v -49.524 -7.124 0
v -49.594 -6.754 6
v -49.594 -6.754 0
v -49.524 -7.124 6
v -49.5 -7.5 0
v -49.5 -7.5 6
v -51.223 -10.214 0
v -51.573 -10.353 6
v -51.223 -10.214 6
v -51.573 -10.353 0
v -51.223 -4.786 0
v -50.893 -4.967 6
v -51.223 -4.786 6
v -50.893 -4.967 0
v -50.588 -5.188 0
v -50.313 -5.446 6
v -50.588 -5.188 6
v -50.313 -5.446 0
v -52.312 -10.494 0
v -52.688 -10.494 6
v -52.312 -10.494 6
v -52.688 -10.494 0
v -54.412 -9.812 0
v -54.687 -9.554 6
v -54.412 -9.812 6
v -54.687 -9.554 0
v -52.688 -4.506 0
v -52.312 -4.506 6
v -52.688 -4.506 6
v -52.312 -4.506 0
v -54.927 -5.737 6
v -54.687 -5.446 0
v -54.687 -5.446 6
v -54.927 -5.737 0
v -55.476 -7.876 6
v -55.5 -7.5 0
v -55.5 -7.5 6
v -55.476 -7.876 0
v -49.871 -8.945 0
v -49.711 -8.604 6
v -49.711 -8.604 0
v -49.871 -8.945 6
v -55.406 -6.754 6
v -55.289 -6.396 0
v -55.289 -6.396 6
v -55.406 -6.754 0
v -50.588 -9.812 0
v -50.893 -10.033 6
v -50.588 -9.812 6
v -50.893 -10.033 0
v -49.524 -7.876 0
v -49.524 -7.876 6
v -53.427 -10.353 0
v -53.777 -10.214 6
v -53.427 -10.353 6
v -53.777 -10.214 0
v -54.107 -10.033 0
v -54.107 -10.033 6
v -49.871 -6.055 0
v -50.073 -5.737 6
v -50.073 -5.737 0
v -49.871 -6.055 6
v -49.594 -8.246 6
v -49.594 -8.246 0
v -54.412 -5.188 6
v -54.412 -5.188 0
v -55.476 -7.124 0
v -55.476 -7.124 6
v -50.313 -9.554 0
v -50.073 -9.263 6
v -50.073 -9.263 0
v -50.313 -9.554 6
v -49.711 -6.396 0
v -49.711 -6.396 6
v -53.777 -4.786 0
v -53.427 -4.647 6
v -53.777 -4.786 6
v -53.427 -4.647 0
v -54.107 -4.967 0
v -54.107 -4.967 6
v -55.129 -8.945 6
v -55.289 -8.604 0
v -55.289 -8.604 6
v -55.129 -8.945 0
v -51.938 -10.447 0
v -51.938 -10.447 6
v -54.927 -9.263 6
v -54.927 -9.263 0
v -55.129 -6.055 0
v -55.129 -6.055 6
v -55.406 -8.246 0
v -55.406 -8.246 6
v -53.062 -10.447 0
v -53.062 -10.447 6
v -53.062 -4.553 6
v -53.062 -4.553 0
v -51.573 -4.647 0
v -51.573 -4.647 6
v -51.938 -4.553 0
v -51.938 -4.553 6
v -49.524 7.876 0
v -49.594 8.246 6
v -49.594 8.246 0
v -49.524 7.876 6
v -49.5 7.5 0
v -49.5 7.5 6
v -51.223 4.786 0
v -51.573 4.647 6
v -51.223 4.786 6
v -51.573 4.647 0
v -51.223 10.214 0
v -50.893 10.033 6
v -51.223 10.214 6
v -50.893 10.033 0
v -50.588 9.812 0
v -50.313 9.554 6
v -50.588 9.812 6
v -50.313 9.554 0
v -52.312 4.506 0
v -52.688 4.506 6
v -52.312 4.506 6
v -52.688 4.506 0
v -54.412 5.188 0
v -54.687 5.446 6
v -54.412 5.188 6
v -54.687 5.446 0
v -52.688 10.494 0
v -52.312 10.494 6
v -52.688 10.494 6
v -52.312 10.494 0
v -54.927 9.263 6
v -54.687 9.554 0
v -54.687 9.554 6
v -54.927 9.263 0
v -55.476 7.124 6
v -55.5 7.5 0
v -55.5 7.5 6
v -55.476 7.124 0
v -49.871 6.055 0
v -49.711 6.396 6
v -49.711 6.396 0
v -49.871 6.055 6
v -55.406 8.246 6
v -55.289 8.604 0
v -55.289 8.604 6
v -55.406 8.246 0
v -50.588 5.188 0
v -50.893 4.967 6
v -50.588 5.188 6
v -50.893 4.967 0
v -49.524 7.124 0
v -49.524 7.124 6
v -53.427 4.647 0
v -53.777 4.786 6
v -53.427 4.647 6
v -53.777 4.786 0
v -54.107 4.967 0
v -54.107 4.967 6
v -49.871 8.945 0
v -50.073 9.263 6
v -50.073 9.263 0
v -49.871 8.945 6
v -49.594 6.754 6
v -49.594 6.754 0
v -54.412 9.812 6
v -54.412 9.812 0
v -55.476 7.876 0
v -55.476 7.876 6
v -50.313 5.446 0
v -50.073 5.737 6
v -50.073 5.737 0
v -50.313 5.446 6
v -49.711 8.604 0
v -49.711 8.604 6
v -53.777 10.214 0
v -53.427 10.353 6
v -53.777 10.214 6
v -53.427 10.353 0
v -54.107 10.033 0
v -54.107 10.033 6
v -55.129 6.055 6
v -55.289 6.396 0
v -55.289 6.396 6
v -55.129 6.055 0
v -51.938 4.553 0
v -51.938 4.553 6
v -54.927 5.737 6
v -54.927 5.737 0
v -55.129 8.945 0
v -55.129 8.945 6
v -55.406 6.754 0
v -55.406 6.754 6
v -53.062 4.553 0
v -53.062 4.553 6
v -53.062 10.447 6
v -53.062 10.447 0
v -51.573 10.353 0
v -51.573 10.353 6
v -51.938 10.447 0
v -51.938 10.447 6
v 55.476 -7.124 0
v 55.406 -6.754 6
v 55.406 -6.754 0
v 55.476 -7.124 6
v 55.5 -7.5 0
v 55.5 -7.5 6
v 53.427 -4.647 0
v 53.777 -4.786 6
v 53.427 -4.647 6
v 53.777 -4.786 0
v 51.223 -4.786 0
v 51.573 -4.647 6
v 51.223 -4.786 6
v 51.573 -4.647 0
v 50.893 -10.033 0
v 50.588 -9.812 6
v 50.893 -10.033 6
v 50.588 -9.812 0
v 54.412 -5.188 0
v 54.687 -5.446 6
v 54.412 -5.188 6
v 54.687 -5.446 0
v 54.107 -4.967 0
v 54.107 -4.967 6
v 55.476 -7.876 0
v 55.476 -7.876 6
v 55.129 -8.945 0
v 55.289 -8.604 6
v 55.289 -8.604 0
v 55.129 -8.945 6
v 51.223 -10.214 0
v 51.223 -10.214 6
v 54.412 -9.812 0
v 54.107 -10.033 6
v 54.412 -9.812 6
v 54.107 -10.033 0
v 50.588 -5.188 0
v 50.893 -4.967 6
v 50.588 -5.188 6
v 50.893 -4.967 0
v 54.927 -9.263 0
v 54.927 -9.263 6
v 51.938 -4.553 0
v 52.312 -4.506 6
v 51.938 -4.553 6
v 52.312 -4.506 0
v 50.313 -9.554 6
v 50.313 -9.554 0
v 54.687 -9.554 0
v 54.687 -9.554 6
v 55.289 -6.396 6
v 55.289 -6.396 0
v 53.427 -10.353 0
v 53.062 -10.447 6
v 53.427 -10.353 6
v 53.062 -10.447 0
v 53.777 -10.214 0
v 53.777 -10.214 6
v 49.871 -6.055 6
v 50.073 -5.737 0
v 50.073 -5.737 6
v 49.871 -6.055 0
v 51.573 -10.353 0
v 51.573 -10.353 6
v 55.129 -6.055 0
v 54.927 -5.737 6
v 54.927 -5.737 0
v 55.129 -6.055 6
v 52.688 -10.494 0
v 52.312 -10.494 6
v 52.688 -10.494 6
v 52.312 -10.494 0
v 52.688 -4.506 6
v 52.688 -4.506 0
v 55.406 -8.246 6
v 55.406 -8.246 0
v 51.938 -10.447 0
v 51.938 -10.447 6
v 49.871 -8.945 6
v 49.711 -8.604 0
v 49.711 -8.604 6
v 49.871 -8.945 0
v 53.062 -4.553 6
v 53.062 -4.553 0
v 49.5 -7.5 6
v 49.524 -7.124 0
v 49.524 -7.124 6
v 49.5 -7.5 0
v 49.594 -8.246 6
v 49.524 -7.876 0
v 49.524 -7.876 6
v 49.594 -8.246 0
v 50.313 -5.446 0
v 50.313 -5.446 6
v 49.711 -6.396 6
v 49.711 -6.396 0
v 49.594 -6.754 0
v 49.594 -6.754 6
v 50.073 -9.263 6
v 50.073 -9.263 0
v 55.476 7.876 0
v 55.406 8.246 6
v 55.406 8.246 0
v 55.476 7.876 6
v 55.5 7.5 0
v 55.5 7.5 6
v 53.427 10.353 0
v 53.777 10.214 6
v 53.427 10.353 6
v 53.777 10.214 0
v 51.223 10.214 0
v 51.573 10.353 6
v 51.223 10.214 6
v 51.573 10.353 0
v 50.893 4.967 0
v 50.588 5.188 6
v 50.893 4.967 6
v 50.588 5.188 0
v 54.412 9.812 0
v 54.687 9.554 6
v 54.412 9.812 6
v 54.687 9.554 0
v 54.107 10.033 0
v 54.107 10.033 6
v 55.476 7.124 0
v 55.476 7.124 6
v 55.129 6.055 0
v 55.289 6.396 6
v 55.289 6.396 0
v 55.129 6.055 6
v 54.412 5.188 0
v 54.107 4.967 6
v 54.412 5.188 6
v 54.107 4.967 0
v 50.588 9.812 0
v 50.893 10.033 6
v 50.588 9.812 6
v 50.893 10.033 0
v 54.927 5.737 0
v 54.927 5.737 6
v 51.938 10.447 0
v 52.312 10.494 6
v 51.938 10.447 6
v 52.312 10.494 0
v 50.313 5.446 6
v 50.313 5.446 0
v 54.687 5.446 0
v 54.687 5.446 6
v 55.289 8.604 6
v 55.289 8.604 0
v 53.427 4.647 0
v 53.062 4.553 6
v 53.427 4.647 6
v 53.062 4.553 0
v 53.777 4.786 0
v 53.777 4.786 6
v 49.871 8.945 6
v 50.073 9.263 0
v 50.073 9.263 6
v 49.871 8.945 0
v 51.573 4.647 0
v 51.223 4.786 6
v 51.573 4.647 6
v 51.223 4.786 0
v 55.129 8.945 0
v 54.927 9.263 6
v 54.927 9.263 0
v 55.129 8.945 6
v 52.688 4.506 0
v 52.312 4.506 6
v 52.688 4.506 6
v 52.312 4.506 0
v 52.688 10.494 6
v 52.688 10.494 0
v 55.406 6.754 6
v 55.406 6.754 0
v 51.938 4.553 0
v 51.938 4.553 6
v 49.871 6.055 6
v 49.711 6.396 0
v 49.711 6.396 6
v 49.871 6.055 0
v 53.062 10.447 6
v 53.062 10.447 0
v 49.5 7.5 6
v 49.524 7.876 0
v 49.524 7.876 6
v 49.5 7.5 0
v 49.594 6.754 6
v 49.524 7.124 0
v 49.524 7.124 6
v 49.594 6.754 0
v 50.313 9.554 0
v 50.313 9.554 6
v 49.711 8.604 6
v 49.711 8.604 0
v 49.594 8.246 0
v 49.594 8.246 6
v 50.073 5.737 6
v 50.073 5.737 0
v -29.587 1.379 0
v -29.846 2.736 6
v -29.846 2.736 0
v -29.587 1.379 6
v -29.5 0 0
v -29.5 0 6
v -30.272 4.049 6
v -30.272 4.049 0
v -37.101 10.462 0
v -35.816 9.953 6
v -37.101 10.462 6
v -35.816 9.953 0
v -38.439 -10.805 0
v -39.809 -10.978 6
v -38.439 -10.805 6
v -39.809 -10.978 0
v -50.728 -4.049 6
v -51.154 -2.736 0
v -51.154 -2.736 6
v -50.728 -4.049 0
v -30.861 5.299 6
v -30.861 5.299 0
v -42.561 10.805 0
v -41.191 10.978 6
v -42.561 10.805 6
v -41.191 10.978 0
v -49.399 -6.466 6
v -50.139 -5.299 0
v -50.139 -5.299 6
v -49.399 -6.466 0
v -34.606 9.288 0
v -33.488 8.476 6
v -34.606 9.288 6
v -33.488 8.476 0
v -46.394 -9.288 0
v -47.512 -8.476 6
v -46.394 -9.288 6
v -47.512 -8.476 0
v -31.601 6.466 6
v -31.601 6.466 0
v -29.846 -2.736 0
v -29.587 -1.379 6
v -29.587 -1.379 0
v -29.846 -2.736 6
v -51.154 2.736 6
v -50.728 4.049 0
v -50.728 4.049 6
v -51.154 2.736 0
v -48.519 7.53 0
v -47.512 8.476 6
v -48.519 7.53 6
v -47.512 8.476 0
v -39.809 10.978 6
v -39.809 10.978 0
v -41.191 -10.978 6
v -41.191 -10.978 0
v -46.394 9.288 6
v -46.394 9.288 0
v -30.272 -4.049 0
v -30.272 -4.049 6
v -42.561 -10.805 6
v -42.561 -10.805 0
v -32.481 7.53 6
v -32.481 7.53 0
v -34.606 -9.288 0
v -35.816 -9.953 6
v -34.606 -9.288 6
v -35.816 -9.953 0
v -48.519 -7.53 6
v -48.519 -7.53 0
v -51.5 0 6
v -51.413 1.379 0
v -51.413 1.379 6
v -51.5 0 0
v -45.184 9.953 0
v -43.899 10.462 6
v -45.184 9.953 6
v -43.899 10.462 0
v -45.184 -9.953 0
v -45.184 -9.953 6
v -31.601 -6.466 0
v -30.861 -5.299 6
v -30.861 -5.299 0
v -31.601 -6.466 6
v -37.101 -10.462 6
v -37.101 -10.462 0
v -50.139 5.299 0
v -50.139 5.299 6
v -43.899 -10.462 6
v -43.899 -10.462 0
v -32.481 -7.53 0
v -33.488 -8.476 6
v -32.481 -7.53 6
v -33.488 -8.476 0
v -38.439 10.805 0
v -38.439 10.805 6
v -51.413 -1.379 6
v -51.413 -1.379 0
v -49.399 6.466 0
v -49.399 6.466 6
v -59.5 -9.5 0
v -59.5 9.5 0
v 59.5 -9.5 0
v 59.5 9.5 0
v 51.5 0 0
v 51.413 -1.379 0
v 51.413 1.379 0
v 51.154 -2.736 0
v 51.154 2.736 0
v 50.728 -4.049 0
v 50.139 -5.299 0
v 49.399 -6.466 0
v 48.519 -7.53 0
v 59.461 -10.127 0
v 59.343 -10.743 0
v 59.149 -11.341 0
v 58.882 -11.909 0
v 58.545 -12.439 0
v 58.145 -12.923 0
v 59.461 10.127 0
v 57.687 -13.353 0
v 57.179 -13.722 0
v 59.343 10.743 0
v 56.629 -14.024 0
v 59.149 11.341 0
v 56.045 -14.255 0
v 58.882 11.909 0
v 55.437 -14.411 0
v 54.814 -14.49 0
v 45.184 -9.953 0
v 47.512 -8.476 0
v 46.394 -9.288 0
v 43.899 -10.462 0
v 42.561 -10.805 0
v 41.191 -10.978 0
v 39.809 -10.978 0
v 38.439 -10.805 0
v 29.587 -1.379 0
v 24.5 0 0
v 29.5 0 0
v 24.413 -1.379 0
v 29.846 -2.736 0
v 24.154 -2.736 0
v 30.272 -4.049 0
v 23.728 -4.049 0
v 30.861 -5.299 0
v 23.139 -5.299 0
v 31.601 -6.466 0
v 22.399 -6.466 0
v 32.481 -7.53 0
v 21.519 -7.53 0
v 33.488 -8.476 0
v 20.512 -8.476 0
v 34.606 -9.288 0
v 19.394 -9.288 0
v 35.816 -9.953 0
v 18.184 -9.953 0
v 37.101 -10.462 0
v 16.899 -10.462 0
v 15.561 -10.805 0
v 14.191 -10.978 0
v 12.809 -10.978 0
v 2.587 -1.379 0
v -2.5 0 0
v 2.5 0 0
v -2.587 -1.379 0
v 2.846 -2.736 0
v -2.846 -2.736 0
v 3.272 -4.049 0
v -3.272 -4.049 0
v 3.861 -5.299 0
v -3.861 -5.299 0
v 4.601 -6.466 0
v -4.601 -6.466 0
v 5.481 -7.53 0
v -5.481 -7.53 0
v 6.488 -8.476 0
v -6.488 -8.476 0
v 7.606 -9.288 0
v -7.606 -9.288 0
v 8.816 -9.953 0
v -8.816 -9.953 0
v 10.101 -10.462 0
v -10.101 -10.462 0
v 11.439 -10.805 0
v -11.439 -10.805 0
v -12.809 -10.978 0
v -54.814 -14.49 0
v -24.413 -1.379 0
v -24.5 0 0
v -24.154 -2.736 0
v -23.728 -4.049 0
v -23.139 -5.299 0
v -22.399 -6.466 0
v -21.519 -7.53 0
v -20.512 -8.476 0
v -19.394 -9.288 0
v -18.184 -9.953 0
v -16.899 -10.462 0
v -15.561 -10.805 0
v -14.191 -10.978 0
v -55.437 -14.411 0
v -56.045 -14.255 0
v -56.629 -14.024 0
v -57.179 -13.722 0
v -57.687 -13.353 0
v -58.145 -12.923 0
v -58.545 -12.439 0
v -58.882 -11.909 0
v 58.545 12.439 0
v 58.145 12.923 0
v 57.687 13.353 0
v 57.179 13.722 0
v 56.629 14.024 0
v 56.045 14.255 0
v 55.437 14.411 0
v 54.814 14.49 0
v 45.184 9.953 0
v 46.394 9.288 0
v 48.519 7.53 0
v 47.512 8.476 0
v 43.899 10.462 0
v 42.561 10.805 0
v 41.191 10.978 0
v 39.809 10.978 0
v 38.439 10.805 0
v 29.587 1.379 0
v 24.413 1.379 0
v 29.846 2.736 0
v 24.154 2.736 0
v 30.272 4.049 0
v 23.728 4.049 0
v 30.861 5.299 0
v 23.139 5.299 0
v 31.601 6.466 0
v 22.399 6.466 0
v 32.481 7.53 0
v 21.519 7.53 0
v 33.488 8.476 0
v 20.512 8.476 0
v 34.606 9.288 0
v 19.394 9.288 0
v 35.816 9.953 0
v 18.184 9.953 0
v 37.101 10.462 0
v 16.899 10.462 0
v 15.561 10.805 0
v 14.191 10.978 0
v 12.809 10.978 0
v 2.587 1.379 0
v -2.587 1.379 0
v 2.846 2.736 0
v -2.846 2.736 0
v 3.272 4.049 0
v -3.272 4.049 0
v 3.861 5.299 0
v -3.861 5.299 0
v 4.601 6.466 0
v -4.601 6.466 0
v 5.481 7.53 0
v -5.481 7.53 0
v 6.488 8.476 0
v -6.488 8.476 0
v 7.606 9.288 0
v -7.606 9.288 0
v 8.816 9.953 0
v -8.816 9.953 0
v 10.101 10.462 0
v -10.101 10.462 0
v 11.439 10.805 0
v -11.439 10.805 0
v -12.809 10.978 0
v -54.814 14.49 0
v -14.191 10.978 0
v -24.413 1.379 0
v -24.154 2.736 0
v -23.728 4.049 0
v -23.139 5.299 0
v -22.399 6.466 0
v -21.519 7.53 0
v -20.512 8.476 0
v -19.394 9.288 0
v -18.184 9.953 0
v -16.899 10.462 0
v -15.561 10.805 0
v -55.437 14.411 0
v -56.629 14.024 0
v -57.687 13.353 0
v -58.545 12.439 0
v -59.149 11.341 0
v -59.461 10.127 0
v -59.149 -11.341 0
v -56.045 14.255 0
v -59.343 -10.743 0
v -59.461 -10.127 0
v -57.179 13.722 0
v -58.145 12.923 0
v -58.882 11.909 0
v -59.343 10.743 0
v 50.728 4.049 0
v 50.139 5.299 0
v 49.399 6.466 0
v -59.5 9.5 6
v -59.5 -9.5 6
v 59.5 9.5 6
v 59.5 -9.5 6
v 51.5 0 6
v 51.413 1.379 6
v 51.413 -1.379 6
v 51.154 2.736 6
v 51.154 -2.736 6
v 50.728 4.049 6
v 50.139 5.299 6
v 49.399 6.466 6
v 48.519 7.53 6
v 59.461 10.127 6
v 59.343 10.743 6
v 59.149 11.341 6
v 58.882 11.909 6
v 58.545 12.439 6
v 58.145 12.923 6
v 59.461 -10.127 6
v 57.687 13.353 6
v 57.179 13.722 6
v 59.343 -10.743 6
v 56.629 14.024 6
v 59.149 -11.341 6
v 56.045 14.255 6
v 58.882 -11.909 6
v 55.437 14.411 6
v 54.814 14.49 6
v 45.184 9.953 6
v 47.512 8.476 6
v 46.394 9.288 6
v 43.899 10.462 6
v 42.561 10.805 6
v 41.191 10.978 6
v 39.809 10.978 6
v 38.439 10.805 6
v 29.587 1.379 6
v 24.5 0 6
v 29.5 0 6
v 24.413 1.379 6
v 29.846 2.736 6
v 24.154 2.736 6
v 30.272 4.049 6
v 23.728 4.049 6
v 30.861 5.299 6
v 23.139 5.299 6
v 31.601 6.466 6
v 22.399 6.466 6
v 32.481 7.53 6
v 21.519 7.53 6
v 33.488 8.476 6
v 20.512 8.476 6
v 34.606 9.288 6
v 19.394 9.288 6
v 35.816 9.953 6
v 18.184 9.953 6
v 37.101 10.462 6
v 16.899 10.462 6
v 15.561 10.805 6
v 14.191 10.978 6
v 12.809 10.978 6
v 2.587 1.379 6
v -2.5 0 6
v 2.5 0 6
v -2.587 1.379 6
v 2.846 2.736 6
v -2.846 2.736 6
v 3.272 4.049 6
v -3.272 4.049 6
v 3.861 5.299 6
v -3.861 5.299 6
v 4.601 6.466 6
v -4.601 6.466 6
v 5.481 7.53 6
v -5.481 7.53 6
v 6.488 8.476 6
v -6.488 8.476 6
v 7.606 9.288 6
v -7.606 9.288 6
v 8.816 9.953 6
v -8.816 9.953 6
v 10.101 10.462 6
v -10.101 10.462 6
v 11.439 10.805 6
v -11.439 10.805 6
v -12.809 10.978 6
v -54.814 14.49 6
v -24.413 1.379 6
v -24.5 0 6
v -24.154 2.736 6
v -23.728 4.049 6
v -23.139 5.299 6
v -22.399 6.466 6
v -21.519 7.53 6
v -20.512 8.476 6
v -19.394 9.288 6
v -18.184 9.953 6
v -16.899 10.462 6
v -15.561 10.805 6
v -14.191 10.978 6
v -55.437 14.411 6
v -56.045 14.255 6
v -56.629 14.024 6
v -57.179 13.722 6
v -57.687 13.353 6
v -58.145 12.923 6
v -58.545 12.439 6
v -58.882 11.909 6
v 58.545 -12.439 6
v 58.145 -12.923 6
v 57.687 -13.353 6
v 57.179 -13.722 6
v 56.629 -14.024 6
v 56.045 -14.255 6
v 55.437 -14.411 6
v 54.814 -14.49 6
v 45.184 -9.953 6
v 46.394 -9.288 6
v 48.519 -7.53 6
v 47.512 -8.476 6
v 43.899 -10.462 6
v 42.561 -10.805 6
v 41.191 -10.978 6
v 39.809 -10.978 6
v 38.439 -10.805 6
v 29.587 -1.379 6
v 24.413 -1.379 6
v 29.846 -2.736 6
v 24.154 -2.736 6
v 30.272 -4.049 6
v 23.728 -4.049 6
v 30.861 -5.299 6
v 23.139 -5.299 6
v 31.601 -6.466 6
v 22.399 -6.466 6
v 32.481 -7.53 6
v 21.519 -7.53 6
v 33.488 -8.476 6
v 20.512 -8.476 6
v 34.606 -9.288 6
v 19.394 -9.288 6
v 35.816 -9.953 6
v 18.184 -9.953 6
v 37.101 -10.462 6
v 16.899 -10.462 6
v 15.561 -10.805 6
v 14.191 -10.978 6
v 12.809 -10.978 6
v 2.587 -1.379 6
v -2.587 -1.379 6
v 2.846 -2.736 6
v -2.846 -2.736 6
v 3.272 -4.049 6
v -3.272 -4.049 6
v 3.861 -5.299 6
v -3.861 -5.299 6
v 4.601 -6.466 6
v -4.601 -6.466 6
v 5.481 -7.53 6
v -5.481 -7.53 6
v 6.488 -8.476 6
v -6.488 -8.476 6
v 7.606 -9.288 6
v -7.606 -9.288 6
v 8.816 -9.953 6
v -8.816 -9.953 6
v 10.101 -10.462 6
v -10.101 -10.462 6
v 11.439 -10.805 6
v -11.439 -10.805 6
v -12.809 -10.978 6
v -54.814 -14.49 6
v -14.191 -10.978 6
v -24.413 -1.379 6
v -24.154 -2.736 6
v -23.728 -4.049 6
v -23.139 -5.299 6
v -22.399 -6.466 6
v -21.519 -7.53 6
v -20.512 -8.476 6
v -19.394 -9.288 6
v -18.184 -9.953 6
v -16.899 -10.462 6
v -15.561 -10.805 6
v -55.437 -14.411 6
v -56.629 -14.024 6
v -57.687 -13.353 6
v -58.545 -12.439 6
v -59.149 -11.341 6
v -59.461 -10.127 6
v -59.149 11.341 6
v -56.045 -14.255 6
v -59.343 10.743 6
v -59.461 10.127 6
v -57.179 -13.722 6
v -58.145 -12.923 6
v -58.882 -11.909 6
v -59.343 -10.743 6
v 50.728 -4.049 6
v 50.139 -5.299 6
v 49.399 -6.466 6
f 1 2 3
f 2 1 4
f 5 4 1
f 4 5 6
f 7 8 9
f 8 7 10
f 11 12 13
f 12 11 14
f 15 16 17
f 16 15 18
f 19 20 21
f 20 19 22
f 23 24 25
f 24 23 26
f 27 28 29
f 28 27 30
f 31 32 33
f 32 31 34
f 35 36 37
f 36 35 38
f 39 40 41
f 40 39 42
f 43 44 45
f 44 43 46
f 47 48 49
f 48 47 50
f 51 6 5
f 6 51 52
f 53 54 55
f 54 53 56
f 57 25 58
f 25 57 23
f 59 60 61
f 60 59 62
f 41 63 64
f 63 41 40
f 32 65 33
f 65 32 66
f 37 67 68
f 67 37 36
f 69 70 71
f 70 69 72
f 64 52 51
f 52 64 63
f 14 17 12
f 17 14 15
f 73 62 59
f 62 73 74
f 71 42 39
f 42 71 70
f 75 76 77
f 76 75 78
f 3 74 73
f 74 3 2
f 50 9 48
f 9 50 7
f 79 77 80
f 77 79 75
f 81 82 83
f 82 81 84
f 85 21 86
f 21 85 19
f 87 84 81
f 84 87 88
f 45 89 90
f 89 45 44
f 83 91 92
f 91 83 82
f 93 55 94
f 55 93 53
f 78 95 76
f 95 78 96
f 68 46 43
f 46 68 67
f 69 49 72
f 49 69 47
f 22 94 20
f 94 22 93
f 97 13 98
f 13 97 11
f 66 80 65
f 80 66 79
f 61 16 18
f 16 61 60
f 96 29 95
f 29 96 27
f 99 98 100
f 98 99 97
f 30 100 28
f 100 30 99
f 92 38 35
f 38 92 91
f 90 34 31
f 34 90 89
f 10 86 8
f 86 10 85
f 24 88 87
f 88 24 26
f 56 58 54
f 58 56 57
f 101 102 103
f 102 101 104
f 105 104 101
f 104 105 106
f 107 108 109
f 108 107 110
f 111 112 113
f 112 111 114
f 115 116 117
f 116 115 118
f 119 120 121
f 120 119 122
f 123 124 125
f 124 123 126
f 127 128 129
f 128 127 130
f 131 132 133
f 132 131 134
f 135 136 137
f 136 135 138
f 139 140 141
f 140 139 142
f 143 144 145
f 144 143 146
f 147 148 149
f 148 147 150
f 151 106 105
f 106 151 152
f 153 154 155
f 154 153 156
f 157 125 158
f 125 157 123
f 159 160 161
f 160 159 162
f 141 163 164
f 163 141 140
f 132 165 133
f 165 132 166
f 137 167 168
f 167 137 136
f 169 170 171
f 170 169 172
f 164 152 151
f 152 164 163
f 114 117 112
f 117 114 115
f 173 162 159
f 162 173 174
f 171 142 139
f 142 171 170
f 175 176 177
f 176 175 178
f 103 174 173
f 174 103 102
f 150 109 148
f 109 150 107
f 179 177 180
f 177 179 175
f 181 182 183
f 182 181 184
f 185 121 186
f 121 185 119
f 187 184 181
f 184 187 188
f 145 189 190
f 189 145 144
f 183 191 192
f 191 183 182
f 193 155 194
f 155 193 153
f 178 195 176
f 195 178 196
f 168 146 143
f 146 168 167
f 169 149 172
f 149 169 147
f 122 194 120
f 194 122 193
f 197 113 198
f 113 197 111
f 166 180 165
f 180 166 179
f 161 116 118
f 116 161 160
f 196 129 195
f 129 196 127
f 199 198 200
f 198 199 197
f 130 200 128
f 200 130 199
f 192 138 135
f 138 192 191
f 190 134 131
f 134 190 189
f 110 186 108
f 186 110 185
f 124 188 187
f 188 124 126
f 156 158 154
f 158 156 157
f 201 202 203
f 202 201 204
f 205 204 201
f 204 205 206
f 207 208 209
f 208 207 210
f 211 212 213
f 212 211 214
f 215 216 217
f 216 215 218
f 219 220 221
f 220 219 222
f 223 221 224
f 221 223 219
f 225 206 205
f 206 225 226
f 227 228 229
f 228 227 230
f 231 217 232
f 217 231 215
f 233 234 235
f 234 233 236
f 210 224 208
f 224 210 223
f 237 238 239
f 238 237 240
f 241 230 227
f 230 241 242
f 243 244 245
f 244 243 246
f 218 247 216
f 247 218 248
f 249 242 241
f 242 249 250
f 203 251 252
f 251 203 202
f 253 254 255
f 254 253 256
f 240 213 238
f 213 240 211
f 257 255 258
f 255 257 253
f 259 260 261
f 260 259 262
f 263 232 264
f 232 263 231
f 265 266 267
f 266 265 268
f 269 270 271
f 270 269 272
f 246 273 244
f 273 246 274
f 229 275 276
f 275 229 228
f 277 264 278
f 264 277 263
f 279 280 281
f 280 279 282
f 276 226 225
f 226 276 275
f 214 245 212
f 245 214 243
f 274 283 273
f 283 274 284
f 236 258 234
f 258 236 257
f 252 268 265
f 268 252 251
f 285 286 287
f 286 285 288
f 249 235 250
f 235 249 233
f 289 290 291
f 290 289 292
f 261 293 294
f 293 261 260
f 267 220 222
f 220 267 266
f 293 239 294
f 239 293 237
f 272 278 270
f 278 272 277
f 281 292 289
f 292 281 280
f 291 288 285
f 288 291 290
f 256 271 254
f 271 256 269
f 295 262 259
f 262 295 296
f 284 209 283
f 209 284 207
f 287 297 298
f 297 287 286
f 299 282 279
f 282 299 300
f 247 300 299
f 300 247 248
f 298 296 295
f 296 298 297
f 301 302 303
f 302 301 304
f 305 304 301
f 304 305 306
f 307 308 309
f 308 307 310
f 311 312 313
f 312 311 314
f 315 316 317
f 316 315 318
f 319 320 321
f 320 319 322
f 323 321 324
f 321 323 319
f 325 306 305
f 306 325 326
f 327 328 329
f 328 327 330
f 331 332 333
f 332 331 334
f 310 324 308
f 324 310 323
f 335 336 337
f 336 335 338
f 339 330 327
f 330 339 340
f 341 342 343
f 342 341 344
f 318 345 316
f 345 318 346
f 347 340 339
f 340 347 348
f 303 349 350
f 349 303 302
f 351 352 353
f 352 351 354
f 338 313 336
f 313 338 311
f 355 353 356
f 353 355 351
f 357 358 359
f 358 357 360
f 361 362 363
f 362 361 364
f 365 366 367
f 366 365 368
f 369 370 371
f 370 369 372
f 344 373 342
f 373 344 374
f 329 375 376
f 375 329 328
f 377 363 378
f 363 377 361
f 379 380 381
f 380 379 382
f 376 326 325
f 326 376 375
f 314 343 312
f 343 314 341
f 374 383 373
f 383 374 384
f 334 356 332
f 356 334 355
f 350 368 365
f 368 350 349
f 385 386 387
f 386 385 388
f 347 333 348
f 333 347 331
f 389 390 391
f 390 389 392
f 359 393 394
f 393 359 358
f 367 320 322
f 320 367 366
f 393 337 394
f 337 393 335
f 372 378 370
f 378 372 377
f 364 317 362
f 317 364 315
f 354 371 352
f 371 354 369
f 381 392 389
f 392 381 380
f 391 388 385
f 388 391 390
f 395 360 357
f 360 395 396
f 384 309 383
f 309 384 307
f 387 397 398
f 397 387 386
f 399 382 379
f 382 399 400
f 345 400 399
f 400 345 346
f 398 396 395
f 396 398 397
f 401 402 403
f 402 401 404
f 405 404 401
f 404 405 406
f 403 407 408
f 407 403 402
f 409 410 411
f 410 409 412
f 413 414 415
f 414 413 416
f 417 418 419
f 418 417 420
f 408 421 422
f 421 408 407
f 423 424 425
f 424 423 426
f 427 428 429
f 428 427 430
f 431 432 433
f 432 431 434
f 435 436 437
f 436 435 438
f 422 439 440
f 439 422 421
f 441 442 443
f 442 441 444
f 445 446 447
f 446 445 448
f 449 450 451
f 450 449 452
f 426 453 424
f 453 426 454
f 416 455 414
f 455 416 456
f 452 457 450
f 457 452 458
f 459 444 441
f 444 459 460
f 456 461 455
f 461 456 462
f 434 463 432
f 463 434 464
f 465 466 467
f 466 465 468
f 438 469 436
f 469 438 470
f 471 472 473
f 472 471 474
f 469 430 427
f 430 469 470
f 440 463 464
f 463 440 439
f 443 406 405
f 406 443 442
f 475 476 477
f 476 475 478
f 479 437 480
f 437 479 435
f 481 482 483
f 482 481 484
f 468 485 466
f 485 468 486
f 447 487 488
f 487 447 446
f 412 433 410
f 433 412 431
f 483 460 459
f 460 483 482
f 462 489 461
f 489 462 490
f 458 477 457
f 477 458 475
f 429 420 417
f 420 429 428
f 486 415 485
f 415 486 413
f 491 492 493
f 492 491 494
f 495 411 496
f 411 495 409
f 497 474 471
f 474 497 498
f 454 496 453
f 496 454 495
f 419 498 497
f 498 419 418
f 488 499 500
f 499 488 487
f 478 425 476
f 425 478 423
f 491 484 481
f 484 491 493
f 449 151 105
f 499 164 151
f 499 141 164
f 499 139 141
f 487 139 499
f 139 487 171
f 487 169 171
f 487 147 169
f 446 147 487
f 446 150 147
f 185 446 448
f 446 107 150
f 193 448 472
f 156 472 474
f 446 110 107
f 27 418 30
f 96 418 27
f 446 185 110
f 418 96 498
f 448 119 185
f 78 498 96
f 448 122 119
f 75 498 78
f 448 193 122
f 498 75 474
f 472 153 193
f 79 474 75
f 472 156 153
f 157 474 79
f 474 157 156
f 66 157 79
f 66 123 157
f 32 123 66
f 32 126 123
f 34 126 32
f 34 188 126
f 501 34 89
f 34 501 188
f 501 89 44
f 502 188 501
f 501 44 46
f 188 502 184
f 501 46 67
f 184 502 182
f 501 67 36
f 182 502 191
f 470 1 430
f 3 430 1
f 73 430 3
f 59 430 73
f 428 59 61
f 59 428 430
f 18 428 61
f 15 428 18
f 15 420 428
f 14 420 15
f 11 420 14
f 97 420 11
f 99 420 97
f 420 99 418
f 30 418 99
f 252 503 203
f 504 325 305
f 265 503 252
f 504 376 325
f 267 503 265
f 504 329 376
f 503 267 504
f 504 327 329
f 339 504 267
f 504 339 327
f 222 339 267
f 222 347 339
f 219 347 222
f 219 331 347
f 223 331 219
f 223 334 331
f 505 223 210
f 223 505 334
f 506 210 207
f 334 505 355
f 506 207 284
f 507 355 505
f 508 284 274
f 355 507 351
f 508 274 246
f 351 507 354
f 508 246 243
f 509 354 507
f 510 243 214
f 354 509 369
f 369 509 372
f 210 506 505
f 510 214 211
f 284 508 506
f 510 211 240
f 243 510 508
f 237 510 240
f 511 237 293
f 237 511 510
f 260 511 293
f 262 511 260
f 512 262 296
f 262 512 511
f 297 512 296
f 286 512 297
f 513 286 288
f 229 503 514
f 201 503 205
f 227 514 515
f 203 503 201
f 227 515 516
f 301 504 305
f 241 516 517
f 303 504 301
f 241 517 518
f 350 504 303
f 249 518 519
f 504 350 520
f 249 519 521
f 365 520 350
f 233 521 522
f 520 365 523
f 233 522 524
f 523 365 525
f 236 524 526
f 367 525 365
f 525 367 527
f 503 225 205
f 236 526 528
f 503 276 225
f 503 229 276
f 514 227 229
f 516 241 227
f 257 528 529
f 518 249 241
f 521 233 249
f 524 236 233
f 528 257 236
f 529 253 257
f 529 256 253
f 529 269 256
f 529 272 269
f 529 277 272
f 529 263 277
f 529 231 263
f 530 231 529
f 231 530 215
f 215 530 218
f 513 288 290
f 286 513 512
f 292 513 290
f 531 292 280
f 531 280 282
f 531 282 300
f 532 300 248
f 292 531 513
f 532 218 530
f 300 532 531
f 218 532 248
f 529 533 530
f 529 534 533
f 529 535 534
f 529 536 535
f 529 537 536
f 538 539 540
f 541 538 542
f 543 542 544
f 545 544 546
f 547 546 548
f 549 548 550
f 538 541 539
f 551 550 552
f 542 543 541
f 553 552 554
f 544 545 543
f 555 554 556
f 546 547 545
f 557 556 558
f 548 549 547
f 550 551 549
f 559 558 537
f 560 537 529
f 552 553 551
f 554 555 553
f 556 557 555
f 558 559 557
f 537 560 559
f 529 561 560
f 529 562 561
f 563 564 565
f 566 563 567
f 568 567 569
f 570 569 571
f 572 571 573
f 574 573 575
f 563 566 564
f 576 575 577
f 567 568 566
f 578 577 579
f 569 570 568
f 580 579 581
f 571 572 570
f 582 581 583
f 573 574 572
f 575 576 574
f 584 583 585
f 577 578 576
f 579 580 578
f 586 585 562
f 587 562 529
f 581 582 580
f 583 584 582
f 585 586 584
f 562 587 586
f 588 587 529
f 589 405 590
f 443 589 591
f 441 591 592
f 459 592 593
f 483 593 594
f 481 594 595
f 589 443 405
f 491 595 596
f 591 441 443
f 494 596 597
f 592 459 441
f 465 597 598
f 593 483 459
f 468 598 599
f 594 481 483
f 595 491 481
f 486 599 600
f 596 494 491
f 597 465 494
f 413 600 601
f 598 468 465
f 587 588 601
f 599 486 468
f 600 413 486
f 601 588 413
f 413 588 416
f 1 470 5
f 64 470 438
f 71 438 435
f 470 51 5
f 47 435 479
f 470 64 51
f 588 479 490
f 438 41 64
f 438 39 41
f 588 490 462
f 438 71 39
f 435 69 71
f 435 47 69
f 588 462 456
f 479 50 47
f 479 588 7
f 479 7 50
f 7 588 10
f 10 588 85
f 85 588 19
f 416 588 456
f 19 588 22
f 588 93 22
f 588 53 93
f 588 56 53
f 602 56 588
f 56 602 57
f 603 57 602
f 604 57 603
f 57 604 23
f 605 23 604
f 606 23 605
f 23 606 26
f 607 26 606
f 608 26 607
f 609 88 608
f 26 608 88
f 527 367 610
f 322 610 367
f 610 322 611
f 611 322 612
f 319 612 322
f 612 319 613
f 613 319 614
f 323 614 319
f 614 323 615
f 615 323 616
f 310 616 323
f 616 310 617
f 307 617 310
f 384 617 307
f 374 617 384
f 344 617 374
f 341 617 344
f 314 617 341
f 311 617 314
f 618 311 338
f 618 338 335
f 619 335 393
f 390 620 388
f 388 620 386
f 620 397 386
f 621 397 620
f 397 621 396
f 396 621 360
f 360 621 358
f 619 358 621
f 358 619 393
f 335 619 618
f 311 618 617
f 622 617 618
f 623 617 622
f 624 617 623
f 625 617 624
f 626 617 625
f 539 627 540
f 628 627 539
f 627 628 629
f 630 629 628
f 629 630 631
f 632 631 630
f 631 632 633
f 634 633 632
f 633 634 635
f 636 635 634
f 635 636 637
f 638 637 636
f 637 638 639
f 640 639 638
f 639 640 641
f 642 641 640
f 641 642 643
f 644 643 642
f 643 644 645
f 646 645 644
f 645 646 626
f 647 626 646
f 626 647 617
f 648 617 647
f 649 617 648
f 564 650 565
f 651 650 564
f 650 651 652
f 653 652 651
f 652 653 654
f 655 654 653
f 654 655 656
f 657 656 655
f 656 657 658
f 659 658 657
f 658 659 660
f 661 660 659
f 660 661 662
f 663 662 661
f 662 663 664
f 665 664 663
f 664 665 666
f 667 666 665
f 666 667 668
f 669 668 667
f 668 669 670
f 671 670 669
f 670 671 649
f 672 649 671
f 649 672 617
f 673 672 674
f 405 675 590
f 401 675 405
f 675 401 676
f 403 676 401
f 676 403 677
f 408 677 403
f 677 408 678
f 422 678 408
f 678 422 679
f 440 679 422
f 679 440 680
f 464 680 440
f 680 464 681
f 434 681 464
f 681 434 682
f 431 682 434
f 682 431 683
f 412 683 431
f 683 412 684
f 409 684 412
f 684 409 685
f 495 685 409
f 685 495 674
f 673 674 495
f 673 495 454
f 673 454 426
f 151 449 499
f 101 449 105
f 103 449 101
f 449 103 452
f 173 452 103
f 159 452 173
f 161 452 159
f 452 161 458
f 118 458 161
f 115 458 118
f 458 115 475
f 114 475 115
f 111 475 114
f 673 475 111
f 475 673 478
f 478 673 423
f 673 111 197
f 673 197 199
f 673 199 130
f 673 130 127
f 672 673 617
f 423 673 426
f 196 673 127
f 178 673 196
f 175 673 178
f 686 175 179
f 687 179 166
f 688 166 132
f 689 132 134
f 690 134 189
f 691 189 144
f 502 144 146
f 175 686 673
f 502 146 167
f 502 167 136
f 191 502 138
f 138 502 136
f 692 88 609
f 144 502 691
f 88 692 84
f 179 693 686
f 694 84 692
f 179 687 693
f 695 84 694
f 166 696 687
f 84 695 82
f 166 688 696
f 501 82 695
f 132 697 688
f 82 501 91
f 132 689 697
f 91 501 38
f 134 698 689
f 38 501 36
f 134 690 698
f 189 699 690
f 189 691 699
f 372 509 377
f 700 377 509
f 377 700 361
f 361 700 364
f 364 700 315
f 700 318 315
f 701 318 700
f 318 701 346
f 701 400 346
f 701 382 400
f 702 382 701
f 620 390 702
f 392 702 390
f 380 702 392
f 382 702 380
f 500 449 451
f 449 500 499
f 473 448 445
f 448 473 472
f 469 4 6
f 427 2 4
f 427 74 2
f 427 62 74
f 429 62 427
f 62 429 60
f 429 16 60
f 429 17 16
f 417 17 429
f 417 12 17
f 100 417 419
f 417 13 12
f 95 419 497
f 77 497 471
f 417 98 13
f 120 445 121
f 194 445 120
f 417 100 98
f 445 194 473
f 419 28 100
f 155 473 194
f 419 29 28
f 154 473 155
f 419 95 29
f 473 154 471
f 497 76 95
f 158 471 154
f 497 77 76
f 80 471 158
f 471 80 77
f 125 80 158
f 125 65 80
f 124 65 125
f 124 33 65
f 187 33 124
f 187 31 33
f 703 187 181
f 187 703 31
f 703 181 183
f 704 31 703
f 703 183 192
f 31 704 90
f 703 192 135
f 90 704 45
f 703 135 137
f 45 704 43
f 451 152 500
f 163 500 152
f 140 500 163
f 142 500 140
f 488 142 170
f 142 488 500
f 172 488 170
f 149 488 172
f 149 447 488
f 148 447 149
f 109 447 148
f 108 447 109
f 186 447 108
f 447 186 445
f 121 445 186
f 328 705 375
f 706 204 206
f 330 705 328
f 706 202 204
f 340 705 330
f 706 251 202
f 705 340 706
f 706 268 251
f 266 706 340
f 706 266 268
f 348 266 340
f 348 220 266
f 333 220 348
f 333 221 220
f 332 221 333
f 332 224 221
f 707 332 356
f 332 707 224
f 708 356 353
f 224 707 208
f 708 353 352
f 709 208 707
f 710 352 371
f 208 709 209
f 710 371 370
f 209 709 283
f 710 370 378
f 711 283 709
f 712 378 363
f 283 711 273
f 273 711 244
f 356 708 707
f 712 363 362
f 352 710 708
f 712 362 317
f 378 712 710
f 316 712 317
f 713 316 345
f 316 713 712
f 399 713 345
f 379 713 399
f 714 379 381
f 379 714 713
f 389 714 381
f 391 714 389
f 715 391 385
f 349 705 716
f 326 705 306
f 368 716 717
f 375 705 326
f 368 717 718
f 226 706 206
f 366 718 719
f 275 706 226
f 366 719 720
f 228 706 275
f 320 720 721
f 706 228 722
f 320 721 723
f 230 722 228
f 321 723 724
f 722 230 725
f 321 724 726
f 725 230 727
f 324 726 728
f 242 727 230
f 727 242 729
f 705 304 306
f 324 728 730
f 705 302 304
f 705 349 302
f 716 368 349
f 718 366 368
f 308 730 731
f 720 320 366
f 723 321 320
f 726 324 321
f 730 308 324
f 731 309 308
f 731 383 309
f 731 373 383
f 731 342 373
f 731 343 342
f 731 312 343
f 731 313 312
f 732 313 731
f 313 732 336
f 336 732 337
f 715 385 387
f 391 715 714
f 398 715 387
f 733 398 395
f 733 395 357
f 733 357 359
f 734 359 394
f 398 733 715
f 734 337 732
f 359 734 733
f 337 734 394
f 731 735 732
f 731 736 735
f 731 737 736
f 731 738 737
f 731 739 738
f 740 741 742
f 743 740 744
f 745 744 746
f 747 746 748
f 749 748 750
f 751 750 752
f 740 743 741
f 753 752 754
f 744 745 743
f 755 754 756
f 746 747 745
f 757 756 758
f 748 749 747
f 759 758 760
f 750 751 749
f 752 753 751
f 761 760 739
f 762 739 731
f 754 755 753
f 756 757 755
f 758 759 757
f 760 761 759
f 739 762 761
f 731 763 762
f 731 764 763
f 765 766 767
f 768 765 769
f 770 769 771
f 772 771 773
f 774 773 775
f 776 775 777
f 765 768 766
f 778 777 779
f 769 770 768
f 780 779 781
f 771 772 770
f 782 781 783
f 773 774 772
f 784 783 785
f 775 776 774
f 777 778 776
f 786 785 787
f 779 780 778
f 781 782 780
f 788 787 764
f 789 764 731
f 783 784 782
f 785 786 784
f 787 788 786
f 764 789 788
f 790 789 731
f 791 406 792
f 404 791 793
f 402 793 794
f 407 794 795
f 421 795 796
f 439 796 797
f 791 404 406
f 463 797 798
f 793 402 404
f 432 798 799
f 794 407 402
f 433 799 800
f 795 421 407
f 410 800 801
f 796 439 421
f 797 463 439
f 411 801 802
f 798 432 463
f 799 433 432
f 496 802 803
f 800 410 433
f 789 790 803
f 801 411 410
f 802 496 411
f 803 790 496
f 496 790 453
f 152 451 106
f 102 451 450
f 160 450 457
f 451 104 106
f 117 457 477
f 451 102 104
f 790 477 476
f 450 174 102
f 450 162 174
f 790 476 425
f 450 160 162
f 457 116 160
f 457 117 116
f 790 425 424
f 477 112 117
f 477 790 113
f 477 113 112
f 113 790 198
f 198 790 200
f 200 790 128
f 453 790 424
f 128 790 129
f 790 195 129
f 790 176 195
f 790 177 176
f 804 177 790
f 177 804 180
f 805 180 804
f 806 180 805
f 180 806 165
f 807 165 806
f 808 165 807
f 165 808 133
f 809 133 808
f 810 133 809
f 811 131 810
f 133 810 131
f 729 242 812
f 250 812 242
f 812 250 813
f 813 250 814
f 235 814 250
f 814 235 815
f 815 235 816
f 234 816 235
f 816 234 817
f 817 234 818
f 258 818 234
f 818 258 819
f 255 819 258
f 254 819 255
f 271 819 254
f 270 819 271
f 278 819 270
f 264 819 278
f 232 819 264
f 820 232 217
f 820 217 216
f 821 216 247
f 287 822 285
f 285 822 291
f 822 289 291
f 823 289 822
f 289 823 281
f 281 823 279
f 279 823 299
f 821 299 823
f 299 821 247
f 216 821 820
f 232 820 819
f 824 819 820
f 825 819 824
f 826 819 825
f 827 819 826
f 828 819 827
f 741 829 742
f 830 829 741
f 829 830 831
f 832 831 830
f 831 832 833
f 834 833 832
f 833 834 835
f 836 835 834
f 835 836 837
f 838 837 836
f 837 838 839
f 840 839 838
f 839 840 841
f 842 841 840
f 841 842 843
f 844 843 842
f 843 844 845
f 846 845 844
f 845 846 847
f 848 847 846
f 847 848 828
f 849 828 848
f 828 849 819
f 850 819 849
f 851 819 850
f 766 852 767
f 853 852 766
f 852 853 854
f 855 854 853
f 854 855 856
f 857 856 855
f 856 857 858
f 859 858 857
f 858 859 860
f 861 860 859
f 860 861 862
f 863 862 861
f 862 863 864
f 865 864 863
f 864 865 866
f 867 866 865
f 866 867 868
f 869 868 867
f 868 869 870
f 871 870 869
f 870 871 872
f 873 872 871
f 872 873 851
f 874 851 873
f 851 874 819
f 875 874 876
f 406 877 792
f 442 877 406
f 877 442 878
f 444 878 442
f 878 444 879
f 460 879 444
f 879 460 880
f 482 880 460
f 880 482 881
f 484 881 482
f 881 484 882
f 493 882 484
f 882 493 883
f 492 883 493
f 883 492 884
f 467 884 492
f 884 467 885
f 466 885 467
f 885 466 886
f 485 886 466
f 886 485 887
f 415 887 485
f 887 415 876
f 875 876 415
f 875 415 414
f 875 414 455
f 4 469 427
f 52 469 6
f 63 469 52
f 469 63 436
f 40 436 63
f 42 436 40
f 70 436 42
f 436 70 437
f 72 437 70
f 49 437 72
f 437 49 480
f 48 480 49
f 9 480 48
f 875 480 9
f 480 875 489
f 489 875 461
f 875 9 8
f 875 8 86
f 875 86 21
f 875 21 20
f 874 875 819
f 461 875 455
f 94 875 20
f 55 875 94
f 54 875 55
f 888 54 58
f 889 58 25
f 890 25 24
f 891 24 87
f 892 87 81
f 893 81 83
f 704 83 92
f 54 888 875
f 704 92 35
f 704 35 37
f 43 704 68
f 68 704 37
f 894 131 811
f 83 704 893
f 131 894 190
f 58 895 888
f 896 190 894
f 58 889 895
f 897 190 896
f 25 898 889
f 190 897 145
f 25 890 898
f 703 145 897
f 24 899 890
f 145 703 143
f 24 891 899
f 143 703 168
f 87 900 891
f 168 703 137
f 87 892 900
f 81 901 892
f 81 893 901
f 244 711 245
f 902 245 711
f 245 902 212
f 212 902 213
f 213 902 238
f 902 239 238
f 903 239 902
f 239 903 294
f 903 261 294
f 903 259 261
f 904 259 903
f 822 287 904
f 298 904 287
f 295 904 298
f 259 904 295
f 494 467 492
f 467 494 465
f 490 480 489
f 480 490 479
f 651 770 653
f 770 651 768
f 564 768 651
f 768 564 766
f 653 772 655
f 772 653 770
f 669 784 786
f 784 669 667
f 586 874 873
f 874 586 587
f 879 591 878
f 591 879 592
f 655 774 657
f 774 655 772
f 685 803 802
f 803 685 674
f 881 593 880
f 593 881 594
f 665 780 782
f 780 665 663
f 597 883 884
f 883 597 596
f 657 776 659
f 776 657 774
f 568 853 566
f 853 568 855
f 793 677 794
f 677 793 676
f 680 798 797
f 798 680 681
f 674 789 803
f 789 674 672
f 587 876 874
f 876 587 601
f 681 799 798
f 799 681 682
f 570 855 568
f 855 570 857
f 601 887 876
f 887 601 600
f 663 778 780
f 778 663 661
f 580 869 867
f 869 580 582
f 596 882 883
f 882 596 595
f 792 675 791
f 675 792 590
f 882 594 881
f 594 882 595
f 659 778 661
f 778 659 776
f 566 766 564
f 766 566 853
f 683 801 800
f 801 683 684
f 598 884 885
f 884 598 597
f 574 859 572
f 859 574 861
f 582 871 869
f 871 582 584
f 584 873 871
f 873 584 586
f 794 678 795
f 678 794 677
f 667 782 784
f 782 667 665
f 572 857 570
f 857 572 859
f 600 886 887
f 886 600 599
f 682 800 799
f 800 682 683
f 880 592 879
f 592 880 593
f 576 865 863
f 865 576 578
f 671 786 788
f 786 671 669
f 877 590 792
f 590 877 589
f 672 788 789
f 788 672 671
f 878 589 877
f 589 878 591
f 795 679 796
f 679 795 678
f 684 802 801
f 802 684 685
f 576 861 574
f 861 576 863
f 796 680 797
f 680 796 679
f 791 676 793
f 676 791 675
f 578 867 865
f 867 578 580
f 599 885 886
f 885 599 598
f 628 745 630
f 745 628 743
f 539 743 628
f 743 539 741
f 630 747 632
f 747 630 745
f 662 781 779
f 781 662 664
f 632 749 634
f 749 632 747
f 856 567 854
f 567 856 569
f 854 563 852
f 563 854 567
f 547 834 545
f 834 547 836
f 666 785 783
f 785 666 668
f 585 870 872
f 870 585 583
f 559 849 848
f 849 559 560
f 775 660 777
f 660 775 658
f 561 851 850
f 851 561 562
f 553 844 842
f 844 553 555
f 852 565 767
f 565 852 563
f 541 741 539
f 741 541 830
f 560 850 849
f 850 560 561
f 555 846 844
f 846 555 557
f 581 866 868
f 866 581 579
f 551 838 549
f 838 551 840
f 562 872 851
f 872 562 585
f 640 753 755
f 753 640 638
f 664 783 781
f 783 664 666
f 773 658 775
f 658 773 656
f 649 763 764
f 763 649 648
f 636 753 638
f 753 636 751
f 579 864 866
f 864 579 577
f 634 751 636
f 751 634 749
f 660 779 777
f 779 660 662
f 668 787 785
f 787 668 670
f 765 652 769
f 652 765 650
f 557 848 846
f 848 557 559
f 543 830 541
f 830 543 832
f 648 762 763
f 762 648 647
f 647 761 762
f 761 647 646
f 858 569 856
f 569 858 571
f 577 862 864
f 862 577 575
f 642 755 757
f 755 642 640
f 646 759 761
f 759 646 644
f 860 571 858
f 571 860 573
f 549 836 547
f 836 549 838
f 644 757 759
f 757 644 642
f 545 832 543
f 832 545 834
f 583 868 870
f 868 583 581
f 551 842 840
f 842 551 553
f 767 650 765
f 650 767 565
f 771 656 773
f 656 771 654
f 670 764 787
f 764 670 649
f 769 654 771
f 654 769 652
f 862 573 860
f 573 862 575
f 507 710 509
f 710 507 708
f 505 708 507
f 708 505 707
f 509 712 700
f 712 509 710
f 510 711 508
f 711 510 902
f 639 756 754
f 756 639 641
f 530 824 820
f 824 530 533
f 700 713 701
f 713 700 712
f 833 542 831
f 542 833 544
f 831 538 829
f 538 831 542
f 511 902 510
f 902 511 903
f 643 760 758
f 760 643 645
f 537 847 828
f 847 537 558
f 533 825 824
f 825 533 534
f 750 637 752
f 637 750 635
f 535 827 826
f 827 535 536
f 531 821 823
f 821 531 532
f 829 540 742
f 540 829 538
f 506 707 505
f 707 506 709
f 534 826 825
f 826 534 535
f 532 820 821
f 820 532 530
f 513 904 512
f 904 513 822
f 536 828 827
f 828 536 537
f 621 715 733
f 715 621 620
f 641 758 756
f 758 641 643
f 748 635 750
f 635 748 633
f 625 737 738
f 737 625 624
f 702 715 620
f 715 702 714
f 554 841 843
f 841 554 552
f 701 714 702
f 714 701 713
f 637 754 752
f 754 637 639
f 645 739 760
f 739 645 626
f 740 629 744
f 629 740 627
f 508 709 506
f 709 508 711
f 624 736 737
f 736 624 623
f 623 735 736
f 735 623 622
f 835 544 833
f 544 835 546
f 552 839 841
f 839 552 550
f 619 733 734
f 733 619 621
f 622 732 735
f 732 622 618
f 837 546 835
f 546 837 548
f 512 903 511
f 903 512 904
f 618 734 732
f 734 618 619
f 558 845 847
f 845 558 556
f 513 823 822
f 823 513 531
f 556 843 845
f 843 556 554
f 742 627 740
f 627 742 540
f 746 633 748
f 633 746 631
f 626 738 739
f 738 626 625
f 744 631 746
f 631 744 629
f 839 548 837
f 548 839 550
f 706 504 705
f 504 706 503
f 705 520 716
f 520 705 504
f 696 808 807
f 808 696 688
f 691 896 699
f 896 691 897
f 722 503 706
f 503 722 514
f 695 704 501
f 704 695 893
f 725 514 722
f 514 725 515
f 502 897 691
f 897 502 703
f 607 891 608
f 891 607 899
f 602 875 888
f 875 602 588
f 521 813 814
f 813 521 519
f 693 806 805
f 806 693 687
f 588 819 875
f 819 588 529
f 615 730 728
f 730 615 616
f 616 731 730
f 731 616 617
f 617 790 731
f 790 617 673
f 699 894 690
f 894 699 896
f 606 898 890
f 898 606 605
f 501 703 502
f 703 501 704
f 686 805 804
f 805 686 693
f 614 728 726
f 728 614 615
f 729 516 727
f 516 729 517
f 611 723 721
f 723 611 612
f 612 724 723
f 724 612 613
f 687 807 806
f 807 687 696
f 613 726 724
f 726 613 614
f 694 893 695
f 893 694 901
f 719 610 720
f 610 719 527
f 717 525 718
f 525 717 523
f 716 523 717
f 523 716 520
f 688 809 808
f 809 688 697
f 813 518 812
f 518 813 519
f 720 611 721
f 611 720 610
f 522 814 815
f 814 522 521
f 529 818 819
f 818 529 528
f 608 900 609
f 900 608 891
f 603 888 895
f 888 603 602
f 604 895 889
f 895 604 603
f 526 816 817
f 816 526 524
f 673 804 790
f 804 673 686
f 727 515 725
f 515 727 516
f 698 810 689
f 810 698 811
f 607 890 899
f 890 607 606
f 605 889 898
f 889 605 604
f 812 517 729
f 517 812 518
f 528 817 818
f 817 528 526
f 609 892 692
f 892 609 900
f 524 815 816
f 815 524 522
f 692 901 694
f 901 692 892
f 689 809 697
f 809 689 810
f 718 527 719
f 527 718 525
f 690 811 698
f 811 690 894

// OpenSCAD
$fn = 50;


difference() {
	union() {
		hull() {
			translate(v = [-54.5000000000, 9.5000000000, 0]) {
				cylinder(h = 6, r = 5);
			}
			translate(v = [54.5000000000, 9.5000000000, 0]) {
				cylinder(h = 6, r = 5);
			}
			translate(v = [-54.5000000000, -9.5000000000, 0]) {
				cylinder(h = 6, r = 5);
			}
			translate(v = [54.5000000000, -9.5000000000, 0]) {
				cylinder(h = 6, r = 5);
			}
		}
	}
	union() {
		#translate(v = [-52.5000000000, -7.5000000000, -100.0000000000]) {
			cylinder(h = 200, r = 3.0000000000);
		}
		#translate(v = [-52.5000000000, 7.5000000000, -100.0000000000]) {
			cylinder(h = 200, r = 3.0000000000);
		}
		#translate(v = [52.5000000000, -7.5000000000, -100.0000000000]) {
			cylinder(h = 200, r = 3.0000000000);
		}
		#translate(v = [52.5000000000, 7.5000000000, -100.0000000000]) {
			cylinder(h = 200, r = 3.0000000000);
		}
		#translate(v = [-40.5000000000, 0, 0]) {
			cylinder(h = 6, r = 11.0000000000);
		}
		#translate(v = [-13.5000000000, 0, 0]) {
			cylinder(h = 6, r = 11.0000000000);
		}
		#translate(v = [13.5000000000, 0, 0]) {
			cylinder(h = 6, r = 11.0000000000);
		}
		#translate(v = [40.5000000000, 0, 0]) {
			cylinder(h = 6, r = 11.0000000000);
		}
	}
}
